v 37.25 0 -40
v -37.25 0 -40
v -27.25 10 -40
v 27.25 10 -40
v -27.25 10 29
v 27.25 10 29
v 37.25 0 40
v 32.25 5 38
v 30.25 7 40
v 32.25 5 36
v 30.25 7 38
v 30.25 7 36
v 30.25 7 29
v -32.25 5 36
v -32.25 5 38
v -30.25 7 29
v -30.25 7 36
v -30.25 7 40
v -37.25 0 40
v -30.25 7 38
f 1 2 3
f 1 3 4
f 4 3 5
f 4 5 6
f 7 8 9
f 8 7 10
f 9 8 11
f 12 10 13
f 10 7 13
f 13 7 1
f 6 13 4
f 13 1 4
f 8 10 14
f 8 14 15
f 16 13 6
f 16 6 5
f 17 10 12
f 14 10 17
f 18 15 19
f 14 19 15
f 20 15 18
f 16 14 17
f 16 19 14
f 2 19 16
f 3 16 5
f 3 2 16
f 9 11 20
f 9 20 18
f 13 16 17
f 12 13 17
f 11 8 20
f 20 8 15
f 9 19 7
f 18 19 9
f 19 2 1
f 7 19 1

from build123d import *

# Parameters (mm, degrees)
SKETCH1_W           = 74.5
SKETCH1_H           = 80
BOSS_EXTRUDE1_DEPTH = 10
SKETCH2_W           = 11
SKETCH2_H           = 3
CUT_EXTRUDE1_DEPTH  = 75.5
SKETCH3_W           = 2
SKETCH3_H           = 2
CUT_EXTRUDE2_DEPTH  = 75.5
CUT_EXTRUDE4_DEPTH  = 81


with BuildPart() as part:
    # Sketch1 → Boss-Extrude1 (new body)
    with BuildSketch(Plane(origin=(0, 0, 0), x_dir=(1, 0, 0), z_dir=(0, 1, 0))):
        Rectangle(SKETCH1_W, SKETCH1_H)
    extrude(amount=BOSS_EXTRUDE1_DEPTH)

    # Sketch2 → Cut-Extrude1 (cut, through all)
    with BuildSketch(Plane.ZY.offset(37.25)):
        with Locations((34.5, 8.5)):
            Rectangle(SKETCH2_W, SKETCH2_H)
    extrude(amount=-CUT_EXTRUDE1_DEPTH, mode=Mode.SUBTRACT)

    # Sketch3 → Cut-Extrude2 (cut, through all)
    with BuildSketch(Plane.ZY.offset(37.25)):
        with Locations((37, 6)):
            Rectangle(SKETCH3_W, SKETCH3_H)
    extrude(amount=-CUT_EXTRUDE2_DEPTH, mode=Mode.SUBTRACT)

    # Sketch4 → Cut-Extrude4 (cut, through all)
    with BuildSketch(Plane(origin=(0, 0, -40), x_dir=(-1, 0, 0), z_dir=(0, 0, -1))):
        Polygon((-37.25, 0), (-27.25, 10), (-37.25, 10), align=None)
        Polygon((37.25, 10), (37.25, 0), (27.25, 10), align=None)
    extrude(amount=-CUT_EXTRUDE4_DEPTH, mode=Mode.SUBTRACT)


solid = part.part
